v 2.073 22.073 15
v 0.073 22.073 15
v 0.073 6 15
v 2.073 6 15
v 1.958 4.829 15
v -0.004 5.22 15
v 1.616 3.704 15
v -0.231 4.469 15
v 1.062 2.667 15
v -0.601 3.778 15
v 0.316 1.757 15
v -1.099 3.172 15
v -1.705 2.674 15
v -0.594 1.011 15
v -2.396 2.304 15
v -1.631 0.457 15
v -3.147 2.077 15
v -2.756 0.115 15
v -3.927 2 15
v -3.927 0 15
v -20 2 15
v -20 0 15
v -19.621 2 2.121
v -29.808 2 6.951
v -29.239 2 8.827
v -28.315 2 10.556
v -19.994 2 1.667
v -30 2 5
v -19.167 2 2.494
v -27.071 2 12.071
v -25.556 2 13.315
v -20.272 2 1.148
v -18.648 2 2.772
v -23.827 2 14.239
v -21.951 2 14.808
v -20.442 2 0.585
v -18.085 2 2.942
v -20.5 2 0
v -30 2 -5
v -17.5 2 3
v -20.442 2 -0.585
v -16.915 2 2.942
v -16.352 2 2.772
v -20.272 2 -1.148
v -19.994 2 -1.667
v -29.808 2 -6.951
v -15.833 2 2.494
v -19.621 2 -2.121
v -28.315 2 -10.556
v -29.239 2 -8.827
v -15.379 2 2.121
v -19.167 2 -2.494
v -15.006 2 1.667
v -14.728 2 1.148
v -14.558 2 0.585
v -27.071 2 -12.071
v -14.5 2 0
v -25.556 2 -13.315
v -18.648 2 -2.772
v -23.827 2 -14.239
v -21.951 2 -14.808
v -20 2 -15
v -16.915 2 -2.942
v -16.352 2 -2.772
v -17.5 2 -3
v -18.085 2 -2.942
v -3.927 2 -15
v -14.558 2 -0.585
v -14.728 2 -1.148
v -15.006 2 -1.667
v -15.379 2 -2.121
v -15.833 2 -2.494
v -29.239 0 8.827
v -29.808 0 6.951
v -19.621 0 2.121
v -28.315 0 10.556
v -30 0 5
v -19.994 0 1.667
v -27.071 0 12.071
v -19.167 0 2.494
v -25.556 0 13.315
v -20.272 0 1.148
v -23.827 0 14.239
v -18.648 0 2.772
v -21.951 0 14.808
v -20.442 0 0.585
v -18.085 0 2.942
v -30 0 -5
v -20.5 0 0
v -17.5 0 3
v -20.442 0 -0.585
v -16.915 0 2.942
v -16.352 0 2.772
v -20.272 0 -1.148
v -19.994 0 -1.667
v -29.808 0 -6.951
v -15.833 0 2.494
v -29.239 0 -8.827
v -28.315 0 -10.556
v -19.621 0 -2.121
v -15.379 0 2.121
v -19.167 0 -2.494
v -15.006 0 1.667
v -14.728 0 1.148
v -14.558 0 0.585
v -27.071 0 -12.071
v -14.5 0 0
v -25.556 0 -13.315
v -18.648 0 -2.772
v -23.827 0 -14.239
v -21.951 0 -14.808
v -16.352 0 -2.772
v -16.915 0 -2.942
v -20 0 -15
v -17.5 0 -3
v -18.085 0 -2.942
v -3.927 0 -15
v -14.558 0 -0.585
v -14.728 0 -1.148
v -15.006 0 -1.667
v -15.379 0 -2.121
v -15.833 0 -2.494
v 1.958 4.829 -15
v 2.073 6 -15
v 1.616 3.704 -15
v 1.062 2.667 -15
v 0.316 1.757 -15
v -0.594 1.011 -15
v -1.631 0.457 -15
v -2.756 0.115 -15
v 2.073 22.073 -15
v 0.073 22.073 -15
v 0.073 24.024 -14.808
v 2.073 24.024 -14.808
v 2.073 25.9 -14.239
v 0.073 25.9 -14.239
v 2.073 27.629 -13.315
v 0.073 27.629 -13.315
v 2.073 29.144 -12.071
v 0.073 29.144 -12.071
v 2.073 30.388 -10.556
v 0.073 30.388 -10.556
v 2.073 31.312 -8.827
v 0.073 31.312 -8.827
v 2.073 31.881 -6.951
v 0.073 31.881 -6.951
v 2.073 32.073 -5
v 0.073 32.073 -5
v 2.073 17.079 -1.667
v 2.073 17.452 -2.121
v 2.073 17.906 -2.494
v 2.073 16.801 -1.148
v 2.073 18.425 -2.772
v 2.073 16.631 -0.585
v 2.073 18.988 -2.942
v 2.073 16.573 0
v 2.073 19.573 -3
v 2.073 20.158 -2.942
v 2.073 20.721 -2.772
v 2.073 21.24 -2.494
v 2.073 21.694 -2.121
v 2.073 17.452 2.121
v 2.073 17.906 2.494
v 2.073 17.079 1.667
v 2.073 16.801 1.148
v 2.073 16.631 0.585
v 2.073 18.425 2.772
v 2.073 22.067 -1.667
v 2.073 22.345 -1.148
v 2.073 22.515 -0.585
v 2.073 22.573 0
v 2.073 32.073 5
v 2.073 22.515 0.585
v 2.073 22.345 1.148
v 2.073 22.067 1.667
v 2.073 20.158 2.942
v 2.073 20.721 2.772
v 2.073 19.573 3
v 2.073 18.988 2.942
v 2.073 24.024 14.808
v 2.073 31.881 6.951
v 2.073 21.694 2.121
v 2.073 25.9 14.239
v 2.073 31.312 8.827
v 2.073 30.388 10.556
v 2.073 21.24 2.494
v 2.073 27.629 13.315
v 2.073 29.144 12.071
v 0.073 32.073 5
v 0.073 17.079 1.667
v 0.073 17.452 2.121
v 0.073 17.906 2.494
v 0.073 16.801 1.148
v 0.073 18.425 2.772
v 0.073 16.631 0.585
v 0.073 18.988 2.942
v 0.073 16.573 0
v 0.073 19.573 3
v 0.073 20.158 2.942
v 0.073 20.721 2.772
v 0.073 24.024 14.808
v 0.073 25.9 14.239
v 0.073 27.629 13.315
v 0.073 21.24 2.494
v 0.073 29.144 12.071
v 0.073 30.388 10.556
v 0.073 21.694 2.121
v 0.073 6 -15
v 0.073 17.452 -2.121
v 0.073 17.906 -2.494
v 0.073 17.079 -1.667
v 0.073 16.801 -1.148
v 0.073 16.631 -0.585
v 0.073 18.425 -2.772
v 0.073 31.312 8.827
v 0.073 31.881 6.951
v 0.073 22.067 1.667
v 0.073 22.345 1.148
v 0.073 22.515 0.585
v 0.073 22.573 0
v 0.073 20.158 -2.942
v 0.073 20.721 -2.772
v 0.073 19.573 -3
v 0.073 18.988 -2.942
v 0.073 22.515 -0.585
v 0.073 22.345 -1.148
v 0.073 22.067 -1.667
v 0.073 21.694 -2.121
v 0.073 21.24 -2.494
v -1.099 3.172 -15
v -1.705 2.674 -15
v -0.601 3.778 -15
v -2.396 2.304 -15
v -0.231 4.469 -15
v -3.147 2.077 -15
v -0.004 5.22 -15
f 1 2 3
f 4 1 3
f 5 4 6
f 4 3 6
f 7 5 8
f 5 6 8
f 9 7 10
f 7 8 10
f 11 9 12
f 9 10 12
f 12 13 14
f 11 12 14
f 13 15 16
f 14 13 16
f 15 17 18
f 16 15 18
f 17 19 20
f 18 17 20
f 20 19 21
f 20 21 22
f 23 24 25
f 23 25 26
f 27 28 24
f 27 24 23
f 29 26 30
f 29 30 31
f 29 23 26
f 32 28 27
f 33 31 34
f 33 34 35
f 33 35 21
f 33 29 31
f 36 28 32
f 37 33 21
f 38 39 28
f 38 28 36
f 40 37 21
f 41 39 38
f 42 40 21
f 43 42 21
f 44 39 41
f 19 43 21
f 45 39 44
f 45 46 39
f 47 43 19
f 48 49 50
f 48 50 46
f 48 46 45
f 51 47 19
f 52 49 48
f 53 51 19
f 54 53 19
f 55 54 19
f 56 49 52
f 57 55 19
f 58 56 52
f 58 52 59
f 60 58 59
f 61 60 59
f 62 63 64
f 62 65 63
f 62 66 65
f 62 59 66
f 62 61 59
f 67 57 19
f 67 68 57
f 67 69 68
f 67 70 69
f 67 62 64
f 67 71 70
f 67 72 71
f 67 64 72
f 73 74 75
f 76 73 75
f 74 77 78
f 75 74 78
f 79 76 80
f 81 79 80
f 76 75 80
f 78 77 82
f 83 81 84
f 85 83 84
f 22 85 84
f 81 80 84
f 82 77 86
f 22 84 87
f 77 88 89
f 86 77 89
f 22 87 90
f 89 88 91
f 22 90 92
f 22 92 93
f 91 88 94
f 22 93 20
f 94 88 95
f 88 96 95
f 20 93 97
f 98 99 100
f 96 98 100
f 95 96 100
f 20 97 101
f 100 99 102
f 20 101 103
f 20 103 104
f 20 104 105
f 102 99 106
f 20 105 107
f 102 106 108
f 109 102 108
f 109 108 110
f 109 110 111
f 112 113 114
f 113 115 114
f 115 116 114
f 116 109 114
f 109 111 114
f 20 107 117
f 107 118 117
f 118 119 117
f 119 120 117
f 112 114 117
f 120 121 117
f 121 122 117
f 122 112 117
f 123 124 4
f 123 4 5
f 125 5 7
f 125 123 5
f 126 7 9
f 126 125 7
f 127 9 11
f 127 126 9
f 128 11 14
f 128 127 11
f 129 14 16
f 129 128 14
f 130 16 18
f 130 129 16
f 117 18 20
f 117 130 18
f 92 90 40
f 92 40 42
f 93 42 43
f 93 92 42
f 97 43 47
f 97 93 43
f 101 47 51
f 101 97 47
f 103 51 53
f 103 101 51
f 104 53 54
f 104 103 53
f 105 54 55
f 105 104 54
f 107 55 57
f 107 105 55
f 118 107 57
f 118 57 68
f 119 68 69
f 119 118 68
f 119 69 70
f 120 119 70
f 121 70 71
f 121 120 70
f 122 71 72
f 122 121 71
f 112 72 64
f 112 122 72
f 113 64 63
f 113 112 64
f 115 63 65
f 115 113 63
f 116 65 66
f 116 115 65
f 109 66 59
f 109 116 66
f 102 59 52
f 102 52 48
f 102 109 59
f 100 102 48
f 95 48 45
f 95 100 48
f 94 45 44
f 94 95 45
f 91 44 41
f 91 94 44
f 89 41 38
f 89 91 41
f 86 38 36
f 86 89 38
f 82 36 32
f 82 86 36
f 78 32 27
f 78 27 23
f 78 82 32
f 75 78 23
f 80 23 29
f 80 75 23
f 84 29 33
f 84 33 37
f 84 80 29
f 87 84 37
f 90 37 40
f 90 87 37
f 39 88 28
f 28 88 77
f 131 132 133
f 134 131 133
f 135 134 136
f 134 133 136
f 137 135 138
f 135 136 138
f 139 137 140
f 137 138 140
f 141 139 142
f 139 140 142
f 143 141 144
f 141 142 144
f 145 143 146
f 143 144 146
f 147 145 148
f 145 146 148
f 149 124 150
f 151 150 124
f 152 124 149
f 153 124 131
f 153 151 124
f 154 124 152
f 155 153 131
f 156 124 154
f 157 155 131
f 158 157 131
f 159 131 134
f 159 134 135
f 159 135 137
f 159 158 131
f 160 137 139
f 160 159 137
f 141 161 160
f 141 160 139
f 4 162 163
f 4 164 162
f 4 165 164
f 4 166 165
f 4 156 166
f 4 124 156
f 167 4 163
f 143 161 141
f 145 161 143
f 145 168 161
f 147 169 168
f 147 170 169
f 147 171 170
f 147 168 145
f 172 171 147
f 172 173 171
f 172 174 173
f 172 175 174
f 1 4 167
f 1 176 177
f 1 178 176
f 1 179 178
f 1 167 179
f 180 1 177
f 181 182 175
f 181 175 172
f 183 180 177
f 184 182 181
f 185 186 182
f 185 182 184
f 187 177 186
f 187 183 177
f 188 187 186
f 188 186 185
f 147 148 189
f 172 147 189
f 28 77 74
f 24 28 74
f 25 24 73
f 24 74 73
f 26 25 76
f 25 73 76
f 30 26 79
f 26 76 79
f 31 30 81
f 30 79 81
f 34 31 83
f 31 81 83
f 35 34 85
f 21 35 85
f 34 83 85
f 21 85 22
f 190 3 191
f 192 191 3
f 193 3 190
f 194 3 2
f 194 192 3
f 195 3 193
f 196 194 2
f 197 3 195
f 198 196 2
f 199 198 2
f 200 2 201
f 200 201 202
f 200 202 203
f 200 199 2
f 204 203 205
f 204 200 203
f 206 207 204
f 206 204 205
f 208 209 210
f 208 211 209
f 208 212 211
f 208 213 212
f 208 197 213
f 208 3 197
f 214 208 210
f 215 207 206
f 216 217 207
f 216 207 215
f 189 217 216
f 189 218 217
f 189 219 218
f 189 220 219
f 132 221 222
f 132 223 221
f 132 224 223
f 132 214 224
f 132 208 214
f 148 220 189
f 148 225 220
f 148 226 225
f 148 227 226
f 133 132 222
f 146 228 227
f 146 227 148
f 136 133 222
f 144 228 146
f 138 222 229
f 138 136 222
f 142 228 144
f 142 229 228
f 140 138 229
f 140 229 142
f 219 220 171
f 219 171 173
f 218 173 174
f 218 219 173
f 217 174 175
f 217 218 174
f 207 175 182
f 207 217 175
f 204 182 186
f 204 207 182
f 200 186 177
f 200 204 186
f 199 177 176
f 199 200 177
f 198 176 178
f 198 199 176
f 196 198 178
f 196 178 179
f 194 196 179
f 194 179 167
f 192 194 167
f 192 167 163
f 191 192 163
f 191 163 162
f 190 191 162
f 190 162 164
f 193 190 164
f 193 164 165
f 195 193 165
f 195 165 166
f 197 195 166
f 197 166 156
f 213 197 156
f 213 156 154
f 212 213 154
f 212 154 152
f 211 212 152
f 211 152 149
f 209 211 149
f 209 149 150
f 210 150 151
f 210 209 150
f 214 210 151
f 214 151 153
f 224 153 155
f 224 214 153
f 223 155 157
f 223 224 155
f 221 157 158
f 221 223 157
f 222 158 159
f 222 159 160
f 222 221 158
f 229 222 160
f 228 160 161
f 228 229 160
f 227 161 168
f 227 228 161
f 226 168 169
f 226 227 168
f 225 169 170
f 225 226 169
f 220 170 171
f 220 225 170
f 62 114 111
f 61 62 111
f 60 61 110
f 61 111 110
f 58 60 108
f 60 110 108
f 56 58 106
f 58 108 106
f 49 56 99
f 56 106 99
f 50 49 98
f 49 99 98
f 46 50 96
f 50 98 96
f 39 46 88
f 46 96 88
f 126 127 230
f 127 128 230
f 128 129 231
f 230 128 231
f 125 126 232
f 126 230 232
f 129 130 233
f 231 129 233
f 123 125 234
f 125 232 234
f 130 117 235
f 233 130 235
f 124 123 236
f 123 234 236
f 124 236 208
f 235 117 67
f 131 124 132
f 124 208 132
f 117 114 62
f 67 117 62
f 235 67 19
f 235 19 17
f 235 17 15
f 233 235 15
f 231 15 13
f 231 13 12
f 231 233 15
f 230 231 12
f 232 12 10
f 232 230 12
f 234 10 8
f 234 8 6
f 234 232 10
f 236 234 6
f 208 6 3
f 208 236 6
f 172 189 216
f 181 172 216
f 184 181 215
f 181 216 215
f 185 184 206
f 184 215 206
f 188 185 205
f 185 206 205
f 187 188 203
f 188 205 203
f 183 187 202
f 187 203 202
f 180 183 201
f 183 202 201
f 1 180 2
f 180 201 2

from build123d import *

# Parameters (mm, degrees)
SKETCH1_R                  = 3
EXTRUDE2_DEPTH             = 2
SKETCHED_START             = 1.456569183
SKETCHED_BEND1_OUTLINE_W   = 2
SKETCHED_BEND1_OUTLINE_H   = 30
SKETCHED_BEND1_DEPTH       = 28.543430817
SKETCHED_START_2           = 0.073009183
SKETCHED_BEND1_2_OUTLINE_R = 3
SKETCHED_BEND1_2_DEPTH     = 0.036590817
SKETCHED_START_3           = 0.608704599
SKETCHED_BEND1_3_OUTLINE_W = 2
SKETCHED_BEND1_3_OUTLINE_H = 30
SKETCHED_BEND1_3_DEPTH     = 0.847864584
SKETCHED_START_4           = -3.926990817
SKETCHED_BEND1_4_OUTLINE_R = 3
SKETCHED_BEND1_4_DEPTH     = 6
SKETCHED_START_5           = -15
SKETCHED_BEND1_5_DEPTH     = 30


with BuildPart() as part:
    # Sketch1 → Extrude2 (new body)
    with BuildSketch(Plane(origin=(0, 0, 0), x_dir=(1, 0, 0), z_dir=(0, 1, 0))):
        with BuildLine():
            Line((-20, -15), (20, -15))
            ThreePointArc((20, -15), (27.071067812, -12.071067812), (30, -5))
            Line((30, -5), (30, 5))
            ThreePointArc((30, 5), (27.071067812, 12.071067812), (20, 15))
            Line((20, 15), (-20, 15))
            ThreePointArc((-20, 15), (-27.071067812, 12.071067812), (-30, 5))
            Line((-30, 5), (-30, -5))
            ThreePointArc((-30, -5), (-27.071067812, -12.071067812), (-20, -15))
        make_face()
        with Locations(Location((-17.5, 0, 0), (0, 0, 270))):
            Circle(SKETCH1_R, mode=Mode.SUBTRACT)
        with Locations(Location((17.5, 0, 0), (0, 0, 90))):
            Circle(SKETCH1_R, mode=Mode.SUBTRACT)
    extrude(amount=EXTRUDE2_DEPTH)

    # Sketched Bend1: read off the stored shape, not the designer's step
    # Sketched Bend1 outline → Sketched Bend1 (cut)
    with BuildSketch(Plane.YZ.offset(SKETCHED_START)):
        with Locations((1, 0)):
            Rectangle(SKETCHED_BEND1_OUTLINE_W, SKETCHED_BEND1_OUTLINE_H)
    extrude(amount=SKETCHED_BEND1_DEPTH, mode=Mode.SUBTRACT)

    # Sketched Bend1 2 outline → Sketched Bend1 2 (add)
    with BuildSketch(Plane.YZ.offset(SKETCHED_START_2)):
        with BuildLine():
            Line((22.073009183, 15), (2, 15))
            Line((2, 15), (2, -15))
            Line((2, -15), (22.073009183, -15))
            ThreePointArc((22.073009183, -15), (29.144076995, -12.071067812), (32.073009183, -5))
            Line((32.073009183, -5), (32.073009183, 5))
            ThreePointArc((32.073009183, 5), (29.144076995, 12.071067812), (22.073009183, 15))
        make_face()
        with Locations((19.573009183, 0)):
            Circle(SKETCHED_BEND1_2_OUTLINE_R, mode=Mode.SUBTRACT)
    extrude(amount=SKETCHED_BEND1_2_DEPTH)

    # Sketched Bend1 3 outline → Sketched Bend1 3 (cut)
    with BuildSketch(Plane.YZ.offset(SKETCHED_START_3)):
        with Locations((1, 0)):
            Rectangle(SKETCHED_BEND1_3_OUTLINE_W, SKETCHED_BEND1_3_OUTLINE_H)
    extrude(amount=SKETCHED_BEND1_3_DEPTH, mode=Mode.SUBTRACT)

    # Sketched Bend1 4 outline → Sketched Bend1 4 (add)
    with BuildSketch(Plane.YZ.offset(SKETCHED_START_4)):
        with BuildLine():
            Line((22.073009183, 15), (2, 15))
            Line((2, 15), (2, -15))
            Line((2, -15), (22.073009183, -15))
            ThreePointArc((22.073009183, -15), (29.144076995, -12.071067812), (32.073009183, -5))
            Line((32.073009183, -5), (32.073009183, 5))
            ThreePointArc((32.073009183, 5), (29.144076995, 12.071067812), (22.073009183, 15))
        make_face()
        with Locations((19.573009183, 0)):
            Circle(SKETCHED_BEND1_4_OUTLINE_R, mode=Mode.SUBTRACT)
    extrude(amount=SKETCHED_BEND1_4_DEPTH)

    # Sketched Bend1 5 outline → Sketched Bend1 5 (cut)
    with BuildSketch(Plane.XY.offset(SKETCHED_START_5)):
        with BuildLine():
            ThreePointArc((-3.926990817, 2), (-1.098563692, 3.171572875), (0.073009183, 6))
            Line((0.073009183, 6), (0.073009183, 32.073009183))
            Line((0.073009183, 32.073009183), (-3.926990817, 32.073009183))
            Line((-3.926990817, 32.073009183), (-3.926990817, 2))
        make_face()
        with BuildLine():
            Line((2.073009183, 2), (2.073009183, 6))
            ThreePointArc((2.073009183, 6), (0.31564987, 1.757359313), (-3.926990817, 0))
            Line((-3.926990817, 0), (0.608704599, 0))
            Line((0.608704599, 0), (0.608704599, 2))
            Line((0.608704599, 2), (2.073009183, 2))
        make_face()
    extrude(amount=SKETCHED_BEND1_5_DEPTH, mode=Mode.SUBTRACT)


solid = part.part
